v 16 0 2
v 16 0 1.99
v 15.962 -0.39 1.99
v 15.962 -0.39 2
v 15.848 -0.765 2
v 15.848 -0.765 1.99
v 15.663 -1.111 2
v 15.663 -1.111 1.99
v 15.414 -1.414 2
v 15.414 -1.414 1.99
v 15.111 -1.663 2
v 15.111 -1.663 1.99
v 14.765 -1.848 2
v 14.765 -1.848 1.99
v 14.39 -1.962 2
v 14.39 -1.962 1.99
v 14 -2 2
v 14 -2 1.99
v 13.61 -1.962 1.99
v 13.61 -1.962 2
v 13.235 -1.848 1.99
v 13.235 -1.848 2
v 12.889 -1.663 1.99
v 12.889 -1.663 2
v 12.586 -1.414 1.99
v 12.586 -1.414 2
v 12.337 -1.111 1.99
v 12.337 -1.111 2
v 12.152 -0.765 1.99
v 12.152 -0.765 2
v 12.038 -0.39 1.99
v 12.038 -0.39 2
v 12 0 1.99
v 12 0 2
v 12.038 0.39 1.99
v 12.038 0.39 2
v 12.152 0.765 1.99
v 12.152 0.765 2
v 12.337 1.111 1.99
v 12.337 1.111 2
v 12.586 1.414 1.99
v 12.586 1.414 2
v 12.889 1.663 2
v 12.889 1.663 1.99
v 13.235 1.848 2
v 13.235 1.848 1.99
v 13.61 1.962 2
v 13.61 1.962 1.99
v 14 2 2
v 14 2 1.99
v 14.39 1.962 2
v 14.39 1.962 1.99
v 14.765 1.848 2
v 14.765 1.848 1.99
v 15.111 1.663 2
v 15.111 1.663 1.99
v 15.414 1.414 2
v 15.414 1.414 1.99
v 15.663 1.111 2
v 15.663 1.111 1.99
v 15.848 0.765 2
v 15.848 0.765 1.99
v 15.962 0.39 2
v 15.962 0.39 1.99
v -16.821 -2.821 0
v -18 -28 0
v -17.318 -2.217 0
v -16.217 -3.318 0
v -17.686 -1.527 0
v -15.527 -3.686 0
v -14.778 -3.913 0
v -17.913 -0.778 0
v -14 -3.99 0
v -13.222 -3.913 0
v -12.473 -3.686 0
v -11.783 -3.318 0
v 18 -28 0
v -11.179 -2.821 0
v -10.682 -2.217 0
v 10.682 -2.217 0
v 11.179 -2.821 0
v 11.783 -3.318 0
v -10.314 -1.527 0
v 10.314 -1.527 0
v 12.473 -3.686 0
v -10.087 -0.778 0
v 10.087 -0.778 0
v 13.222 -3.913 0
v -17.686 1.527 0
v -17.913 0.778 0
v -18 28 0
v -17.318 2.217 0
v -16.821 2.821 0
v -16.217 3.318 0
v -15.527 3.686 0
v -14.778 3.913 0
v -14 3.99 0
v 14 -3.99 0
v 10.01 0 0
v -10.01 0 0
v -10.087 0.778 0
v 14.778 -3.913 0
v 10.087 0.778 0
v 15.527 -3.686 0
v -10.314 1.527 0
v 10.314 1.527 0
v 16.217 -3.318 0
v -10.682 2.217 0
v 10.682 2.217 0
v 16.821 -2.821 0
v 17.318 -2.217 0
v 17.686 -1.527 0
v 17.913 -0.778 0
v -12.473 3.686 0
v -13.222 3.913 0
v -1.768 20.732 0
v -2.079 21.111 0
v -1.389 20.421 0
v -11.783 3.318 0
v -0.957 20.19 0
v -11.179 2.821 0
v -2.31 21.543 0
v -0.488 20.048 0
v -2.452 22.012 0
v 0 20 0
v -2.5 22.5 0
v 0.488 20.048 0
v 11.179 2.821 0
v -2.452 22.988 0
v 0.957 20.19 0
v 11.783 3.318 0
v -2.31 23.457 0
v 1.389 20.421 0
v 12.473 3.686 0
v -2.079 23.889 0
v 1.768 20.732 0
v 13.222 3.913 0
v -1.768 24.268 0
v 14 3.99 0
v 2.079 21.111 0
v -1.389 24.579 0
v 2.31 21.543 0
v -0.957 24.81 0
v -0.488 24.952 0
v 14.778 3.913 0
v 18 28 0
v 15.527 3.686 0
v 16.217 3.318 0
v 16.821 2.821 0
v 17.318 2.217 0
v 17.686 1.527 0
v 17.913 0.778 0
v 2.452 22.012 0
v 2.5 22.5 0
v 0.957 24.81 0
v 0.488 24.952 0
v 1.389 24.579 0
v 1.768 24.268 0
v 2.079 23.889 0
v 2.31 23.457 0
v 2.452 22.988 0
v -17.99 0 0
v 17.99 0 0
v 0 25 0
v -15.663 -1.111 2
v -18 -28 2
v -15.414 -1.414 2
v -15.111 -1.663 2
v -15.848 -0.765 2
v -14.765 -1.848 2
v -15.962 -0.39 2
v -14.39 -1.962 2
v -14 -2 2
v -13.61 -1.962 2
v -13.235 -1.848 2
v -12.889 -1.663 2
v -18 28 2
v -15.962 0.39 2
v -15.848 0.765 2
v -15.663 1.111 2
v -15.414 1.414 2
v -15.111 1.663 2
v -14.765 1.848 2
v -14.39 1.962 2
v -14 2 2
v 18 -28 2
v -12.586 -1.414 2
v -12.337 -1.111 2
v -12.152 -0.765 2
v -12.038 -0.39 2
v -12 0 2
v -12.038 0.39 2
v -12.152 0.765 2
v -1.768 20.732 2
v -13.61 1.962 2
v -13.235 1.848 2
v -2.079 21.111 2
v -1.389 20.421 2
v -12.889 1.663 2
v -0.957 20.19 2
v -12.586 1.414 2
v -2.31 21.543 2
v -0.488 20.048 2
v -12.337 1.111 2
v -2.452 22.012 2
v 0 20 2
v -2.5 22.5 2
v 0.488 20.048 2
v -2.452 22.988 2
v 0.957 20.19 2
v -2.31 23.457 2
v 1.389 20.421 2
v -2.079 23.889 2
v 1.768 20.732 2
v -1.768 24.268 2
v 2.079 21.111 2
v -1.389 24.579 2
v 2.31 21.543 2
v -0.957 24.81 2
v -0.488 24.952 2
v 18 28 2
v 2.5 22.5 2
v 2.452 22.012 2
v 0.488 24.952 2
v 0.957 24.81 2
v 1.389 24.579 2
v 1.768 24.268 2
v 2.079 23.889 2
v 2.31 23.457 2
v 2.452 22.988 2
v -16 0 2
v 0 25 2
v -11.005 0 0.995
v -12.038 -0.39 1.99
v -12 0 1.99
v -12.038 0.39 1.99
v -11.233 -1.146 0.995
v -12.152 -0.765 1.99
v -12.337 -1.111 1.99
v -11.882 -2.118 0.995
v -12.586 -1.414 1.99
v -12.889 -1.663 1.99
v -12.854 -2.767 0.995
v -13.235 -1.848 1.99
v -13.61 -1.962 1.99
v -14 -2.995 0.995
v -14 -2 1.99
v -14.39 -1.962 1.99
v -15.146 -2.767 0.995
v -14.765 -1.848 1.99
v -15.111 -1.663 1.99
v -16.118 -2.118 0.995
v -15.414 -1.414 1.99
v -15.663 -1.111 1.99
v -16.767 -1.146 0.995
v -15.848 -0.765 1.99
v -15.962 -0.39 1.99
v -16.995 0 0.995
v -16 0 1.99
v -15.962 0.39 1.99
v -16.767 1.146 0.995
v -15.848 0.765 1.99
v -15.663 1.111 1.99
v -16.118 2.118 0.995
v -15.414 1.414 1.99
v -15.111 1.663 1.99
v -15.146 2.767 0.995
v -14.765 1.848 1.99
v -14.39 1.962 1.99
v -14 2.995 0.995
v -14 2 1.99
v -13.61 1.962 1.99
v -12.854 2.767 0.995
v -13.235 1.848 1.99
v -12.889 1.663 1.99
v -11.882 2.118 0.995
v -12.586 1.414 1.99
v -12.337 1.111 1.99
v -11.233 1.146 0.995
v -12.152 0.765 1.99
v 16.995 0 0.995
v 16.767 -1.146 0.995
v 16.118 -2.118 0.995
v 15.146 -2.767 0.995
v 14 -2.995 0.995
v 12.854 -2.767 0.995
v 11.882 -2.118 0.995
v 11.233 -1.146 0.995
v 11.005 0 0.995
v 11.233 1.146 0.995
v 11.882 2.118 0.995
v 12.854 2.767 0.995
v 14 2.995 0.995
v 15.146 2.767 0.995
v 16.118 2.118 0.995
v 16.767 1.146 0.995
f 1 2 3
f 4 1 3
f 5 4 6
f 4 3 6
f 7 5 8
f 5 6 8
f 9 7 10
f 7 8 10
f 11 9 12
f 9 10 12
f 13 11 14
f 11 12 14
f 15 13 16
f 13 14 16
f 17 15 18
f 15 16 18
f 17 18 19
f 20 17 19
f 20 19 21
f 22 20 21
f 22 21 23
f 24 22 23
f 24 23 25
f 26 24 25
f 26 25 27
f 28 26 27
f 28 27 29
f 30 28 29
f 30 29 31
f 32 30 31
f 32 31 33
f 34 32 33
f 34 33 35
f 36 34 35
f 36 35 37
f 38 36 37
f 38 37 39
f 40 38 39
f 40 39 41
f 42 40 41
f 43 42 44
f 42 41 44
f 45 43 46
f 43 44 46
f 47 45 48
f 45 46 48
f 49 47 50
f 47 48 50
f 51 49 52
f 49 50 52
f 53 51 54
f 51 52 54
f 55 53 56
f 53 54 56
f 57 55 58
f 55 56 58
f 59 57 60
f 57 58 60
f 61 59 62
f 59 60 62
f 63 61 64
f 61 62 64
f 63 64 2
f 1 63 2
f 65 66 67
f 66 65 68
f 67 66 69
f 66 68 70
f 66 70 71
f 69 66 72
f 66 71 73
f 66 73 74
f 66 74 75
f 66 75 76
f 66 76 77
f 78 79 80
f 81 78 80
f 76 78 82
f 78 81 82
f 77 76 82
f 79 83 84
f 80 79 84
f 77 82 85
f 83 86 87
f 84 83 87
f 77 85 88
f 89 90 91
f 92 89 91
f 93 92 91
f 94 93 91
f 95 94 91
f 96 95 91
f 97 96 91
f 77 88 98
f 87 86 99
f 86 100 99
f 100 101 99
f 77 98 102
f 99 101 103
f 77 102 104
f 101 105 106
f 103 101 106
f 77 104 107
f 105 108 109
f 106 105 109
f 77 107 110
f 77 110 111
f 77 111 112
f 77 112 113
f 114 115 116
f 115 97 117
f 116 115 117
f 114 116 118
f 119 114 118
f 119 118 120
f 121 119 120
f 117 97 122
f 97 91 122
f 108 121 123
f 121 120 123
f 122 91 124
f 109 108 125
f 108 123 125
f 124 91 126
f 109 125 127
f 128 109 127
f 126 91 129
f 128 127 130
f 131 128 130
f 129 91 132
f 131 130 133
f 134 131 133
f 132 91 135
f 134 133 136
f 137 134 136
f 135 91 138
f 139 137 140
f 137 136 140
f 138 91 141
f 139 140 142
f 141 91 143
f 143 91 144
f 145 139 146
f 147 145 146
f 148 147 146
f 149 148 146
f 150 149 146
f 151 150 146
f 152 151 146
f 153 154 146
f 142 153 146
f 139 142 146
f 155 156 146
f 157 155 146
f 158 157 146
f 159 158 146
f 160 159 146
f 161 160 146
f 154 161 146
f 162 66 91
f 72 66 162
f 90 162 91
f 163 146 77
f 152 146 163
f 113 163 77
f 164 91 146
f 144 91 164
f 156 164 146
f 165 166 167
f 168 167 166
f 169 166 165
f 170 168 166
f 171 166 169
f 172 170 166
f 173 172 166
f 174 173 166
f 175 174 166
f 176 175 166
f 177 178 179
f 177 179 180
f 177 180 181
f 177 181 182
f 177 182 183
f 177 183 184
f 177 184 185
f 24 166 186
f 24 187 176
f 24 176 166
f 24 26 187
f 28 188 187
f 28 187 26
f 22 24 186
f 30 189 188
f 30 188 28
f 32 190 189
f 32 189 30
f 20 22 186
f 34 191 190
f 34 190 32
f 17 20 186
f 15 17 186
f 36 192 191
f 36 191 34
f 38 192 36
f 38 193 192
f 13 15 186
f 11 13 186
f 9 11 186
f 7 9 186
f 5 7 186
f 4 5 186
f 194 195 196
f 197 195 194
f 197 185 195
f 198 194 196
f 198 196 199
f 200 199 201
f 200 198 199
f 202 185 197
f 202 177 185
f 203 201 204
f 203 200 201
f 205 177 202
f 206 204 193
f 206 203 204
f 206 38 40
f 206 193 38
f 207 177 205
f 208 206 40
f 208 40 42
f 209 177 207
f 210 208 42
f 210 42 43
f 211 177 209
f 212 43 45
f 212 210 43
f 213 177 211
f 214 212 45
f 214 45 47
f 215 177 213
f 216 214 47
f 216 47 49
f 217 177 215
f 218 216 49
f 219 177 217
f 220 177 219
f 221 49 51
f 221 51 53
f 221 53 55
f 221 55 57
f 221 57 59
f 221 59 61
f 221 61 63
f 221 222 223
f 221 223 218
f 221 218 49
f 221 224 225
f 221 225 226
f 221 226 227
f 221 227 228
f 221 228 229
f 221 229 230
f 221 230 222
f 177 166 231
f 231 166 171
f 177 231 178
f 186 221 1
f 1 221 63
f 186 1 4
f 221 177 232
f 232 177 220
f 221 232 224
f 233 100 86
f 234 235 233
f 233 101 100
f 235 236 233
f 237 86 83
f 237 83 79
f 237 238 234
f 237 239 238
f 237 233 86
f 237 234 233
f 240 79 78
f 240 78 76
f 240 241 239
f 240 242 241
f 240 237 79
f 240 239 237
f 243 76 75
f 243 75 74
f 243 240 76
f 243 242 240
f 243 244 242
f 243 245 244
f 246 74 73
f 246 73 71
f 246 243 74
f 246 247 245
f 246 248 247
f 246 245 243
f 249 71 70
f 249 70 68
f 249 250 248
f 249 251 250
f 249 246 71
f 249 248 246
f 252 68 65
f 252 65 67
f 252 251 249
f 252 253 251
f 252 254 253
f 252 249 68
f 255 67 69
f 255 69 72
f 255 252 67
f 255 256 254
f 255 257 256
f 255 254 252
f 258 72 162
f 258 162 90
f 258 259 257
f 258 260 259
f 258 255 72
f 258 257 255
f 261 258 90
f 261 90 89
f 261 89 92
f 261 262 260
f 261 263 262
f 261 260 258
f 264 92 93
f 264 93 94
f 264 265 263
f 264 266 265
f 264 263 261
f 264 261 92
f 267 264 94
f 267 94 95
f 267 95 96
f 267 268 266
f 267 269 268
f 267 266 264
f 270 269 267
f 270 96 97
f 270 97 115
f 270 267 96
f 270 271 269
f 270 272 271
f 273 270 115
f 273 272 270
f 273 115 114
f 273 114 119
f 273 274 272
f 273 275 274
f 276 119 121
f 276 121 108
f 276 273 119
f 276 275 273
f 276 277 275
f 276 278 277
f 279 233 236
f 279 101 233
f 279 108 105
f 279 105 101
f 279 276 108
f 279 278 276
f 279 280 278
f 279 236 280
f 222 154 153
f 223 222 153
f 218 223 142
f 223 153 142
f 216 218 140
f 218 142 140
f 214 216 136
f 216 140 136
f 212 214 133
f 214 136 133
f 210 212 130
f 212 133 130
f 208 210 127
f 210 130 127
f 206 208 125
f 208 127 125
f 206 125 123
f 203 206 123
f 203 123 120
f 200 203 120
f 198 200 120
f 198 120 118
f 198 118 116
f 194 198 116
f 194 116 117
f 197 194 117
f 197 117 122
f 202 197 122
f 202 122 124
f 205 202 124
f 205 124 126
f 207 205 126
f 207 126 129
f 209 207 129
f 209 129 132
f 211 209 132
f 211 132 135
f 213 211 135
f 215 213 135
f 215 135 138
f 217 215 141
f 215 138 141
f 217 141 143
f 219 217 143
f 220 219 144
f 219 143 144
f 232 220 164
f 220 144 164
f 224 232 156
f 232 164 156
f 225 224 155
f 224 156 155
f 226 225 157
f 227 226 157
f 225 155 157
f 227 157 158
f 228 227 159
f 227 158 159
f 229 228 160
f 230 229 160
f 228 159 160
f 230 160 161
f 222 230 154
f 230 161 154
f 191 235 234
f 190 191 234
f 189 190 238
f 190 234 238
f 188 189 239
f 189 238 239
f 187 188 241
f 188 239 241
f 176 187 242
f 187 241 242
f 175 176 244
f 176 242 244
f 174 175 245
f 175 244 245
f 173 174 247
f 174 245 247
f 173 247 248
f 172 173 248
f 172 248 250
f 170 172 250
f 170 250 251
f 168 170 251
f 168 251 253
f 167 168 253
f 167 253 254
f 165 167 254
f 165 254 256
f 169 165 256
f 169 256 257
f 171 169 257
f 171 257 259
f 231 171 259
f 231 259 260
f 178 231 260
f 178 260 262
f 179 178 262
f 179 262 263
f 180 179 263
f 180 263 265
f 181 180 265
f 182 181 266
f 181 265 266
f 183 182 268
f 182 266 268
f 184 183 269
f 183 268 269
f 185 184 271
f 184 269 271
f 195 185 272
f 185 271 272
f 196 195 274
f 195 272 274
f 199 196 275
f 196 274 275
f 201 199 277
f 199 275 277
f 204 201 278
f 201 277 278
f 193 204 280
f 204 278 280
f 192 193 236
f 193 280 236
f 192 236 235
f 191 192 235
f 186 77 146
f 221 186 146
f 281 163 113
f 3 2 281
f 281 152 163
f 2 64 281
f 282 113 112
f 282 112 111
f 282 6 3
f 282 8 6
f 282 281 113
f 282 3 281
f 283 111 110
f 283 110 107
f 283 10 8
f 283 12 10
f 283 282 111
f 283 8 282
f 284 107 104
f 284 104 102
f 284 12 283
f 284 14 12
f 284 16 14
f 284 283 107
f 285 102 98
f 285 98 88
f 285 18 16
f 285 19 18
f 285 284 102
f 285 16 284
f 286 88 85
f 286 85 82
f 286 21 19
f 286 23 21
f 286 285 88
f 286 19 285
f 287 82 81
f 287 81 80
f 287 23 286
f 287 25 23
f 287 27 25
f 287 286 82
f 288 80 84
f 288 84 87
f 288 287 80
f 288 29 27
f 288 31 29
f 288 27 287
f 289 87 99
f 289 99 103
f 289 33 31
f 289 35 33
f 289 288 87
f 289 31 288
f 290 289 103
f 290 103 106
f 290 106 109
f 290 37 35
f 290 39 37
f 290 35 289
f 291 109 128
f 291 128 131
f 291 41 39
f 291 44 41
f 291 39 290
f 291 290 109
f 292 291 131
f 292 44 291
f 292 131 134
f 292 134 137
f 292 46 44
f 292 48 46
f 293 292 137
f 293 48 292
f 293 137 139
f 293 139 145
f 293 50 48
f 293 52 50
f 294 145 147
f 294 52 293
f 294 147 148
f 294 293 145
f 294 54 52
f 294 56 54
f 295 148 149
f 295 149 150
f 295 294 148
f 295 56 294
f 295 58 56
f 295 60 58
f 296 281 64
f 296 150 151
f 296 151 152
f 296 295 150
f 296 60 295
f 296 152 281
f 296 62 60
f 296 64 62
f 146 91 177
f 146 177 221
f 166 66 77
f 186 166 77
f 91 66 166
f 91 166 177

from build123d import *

# Parameters (mm, degrees)
SKETCH_W        = 36
SKETCH_H        = 56
PAD_DEPTH       = 2
SKETCH001_R     = 2
POCKET_DEPTH    = 3
CHAMFER_SIZE    = 1.99
SKETCH002_R     = 2.5
POCKET001_DEPTH = 3


with BuildPart() as part:
    # Sketch → Pad (new body)
    with BuildSketch(Plane.XY):
        Rectangle(SKETCH_W, SKETCH_H)
    extrude(amount=PAD_DEPTH)

    # Sketch001 (on Face5 of Pad) → Pocket (cut)
    with BuildSketch(Plane(origin=(0, 0, 0), x_dir=(1, 0, 0), z_dir=(0, 0, -1))):
        with Locations((14, 0)):
            Circle(SKETCH001_R)
        with Locations((-14, 0)):
            Circle(SKETCH001_R)
    extrude(amount=-POCKET_DEPTH, mode=Mode.SUBTRACT)

    # Chamfer
    chamfer_edges = [part.edges().sort_by_distance(p)[0] for p in [
        (-16, 0, 0),
        (12, 0, 0),
    ]]
    chamfer(chamfer_edges, length=CHAMFER_SIZE)

    # Sketch002 (on Face1 of Chamfer) → Pocket001 (cut)
    with BuildSketch(Plane(origin=(0, 0, 0), x_dir=(1, 0, 0), z_dir=(0, 0, -1))):
        with Locations((0, -22.5)):
            Circle(SKETCH002_R)
    extrude(amount=-POCKET001_DEPTH, mode=Mode.SUBTRACT)


solid = part.part
